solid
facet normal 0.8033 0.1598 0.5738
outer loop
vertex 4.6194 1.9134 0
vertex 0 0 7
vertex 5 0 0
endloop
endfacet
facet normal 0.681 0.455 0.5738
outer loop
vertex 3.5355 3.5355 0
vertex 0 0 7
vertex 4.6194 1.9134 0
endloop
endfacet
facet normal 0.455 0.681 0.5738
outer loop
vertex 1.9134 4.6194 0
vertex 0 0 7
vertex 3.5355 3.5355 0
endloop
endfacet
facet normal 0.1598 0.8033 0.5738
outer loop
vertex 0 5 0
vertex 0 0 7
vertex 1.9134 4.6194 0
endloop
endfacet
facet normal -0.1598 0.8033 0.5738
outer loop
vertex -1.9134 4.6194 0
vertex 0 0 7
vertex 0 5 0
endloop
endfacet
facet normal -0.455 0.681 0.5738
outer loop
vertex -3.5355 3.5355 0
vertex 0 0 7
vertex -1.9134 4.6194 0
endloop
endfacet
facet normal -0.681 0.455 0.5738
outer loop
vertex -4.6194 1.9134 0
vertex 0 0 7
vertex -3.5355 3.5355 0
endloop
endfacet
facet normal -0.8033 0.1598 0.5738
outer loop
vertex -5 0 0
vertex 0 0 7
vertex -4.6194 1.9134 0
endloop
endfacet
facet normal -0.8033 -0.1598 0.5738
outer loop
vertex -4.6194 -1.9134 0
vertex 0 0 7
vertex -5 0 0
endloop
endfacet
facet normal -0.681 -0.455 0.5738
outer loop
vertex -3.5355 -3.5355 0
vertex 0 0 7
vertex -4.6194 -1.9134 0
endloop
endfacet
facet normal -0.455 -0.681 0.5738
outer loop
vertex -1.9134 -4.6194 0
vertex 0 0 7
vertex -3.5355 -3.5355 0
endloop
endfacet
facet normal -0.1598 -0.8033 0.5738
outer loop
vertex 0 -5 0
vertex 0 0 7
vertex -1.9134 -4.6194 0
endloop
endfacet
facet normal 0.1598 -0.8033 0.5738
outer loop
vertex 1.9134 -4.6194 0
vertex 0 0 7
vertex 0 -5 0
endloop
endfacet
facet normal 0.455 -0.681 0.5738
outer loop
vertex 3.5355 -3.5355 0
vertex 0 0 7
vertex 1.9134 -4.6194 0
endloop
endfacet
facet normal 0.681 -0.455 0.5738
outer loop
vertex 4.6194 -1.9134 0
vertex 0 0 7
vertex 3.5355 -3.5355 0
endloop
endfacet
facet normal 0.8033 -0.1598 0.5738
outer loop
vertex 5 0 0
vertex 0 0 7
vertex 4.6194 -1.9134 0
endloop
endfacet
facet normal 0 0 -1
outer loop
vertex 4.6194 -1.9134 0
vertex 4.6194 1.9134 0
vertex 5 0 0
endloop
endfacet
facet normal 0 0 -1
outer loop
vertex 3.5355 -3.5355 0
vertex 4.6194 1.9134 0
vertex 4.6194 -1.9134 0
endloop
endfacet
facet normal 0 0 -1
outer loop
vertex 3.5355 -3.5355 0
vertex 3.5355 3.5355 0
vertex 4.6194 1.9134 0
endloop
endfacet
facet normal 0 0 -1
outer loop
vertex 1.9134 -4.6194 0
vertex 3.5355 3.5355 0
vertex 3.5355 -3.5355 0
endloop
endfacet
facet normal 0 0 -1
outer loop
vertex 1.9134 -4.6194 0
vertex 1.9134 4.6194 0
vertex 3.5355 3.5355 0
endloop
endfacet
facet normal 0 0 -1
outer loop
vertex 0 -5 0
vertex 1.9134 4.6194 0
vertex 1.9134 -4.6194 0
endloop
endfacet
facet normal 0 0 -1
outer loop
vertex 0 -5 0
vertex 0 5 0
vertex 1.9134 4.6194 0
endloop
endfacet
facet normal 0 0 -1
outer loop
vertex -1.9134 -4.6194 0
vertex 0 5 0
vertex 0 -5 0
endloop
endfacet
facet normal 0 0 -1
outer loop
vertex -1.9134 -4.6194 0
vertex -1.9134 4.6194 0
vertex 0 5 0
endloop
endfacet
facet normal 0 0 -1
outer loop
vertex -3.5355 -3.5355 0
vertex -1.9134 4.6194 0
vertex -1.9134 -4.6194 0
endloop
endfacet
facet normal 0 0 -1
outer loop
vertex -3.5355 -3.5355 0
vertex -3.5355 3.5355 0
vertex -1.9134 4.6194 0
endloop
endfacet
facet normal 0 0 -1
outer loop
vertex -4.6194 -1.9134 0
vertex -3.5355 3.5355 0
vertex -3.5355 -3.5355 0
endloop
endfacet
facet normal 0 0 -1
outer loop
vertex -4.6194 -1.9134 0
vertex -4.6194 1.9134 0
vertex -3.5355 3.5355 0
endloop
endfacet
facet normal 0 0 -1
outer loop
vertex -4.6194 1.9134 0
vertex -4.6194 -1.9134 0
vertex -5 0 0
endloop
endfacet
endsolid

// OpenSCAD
// Generated by SolidPython 1.0.1 on 2020-07-29 00:46:43


cylinder(h = 7, r1 = 5, r2 = 0);
/***********************************************
*********      SolidPython code:      **********
************************************************
 
# import packages: SolidPython
from solid import *
from solid.utils import *
from itertools import chain, combinations, permutations


class Resize:

    def __init__(self, scad_file):
        self.scad_file = scad_file
        #self.scad_file = import_scad(scad_file)
        # cone/cylinder param:
        self.r1 = 0
        self.r2 = 0
        self.h = 0
        # rectangular prism param:
        self.w = 0
        self.l = 0
        # ellipse param:
        self.r = 0

    # import OpenScad code (file name corresponds to shape)


    # classify shape + parameters
    def assign(self, param1, param2, param3):
        if self.scad_file == 'cone.scad':
            self.r1 = param1
            self.r2 = param2
            self.h = param3
        elif self.scad_file == 'cylinder.scad':
            self.r1 = param1
            self.r2 = param2
            self.h = param3
        elif self.scad_file == 'rectangularPrism.scad':
            self.h = param1
            self.l = param2
            self.w = param3
        else:
            self.r = param1
            self.h = param2

    # resize parameters
    def iterate(self):
        x = range(3, 20, 2)
        i = 1
        if self.scad_file == 'cone.scad':
            tempList = list(permutations(x, 2))
            for temp in tempList:
                param1 = temp[0]
                param2 = temp[1]
                filepath = 'produced_scad_files/' + 'cone' + str(param1) + '_' + str(param2) + '_' + '.scad'
                scad_render_to_file(cylinder(h=param1, r1=param2, r2=0), filepath)

        elif self.scad_file == 'cylinder.scad':
            tempList = list(permutations(x, 3))
            for temp in tempList:
                param1 = temp[0]
                param2 = temp[1]
                filepath = 'produced_scad_files/' + 'cylinder' + str(param1) + '_' + str(param2) + '_' + '.scad'
                scad_render_to_file(cylinder(h=param1, r1=param2, r2=param2), filepath)

        elif self.scad_file == 'rectangularPrism.scad':
            tempList = list(permutations(x, 3))
            for temp in tempList:
                param1 = temp[0]
                param2 = temp[1]
                param3 = temp[2]
                filepath = 'produced_scad_files/' + 'rectangularPrism' + str(param1) + '_' + str(param2) + '_' + str(
                    param3) + '.scad'
                scad_render_to_file(cube(size=(param1, param2, param3)), filepath)

        elif self.scad_file == 'ellipse.scad':
            tempList = list(permutations(x, 4))
            for temp in tempList:
                param1 = temp[0]
                param2 = temp[1]
                param3 = temp[2]
                param4 = temp[3]
                filepath = 'produced_scad_files/' + 'ellipse' + str(param1) + '_' + str(param2) + '_' + str(param3) + '_' + str(param4) + '.scad'
                scad_render_to_file(scale([param1, param2, param3])(sphere(r=param4)), filepath)

    def render_to_scadfile(self):
        scad_render_to_file(scad, 'example.scad') 
 
************************************************/
